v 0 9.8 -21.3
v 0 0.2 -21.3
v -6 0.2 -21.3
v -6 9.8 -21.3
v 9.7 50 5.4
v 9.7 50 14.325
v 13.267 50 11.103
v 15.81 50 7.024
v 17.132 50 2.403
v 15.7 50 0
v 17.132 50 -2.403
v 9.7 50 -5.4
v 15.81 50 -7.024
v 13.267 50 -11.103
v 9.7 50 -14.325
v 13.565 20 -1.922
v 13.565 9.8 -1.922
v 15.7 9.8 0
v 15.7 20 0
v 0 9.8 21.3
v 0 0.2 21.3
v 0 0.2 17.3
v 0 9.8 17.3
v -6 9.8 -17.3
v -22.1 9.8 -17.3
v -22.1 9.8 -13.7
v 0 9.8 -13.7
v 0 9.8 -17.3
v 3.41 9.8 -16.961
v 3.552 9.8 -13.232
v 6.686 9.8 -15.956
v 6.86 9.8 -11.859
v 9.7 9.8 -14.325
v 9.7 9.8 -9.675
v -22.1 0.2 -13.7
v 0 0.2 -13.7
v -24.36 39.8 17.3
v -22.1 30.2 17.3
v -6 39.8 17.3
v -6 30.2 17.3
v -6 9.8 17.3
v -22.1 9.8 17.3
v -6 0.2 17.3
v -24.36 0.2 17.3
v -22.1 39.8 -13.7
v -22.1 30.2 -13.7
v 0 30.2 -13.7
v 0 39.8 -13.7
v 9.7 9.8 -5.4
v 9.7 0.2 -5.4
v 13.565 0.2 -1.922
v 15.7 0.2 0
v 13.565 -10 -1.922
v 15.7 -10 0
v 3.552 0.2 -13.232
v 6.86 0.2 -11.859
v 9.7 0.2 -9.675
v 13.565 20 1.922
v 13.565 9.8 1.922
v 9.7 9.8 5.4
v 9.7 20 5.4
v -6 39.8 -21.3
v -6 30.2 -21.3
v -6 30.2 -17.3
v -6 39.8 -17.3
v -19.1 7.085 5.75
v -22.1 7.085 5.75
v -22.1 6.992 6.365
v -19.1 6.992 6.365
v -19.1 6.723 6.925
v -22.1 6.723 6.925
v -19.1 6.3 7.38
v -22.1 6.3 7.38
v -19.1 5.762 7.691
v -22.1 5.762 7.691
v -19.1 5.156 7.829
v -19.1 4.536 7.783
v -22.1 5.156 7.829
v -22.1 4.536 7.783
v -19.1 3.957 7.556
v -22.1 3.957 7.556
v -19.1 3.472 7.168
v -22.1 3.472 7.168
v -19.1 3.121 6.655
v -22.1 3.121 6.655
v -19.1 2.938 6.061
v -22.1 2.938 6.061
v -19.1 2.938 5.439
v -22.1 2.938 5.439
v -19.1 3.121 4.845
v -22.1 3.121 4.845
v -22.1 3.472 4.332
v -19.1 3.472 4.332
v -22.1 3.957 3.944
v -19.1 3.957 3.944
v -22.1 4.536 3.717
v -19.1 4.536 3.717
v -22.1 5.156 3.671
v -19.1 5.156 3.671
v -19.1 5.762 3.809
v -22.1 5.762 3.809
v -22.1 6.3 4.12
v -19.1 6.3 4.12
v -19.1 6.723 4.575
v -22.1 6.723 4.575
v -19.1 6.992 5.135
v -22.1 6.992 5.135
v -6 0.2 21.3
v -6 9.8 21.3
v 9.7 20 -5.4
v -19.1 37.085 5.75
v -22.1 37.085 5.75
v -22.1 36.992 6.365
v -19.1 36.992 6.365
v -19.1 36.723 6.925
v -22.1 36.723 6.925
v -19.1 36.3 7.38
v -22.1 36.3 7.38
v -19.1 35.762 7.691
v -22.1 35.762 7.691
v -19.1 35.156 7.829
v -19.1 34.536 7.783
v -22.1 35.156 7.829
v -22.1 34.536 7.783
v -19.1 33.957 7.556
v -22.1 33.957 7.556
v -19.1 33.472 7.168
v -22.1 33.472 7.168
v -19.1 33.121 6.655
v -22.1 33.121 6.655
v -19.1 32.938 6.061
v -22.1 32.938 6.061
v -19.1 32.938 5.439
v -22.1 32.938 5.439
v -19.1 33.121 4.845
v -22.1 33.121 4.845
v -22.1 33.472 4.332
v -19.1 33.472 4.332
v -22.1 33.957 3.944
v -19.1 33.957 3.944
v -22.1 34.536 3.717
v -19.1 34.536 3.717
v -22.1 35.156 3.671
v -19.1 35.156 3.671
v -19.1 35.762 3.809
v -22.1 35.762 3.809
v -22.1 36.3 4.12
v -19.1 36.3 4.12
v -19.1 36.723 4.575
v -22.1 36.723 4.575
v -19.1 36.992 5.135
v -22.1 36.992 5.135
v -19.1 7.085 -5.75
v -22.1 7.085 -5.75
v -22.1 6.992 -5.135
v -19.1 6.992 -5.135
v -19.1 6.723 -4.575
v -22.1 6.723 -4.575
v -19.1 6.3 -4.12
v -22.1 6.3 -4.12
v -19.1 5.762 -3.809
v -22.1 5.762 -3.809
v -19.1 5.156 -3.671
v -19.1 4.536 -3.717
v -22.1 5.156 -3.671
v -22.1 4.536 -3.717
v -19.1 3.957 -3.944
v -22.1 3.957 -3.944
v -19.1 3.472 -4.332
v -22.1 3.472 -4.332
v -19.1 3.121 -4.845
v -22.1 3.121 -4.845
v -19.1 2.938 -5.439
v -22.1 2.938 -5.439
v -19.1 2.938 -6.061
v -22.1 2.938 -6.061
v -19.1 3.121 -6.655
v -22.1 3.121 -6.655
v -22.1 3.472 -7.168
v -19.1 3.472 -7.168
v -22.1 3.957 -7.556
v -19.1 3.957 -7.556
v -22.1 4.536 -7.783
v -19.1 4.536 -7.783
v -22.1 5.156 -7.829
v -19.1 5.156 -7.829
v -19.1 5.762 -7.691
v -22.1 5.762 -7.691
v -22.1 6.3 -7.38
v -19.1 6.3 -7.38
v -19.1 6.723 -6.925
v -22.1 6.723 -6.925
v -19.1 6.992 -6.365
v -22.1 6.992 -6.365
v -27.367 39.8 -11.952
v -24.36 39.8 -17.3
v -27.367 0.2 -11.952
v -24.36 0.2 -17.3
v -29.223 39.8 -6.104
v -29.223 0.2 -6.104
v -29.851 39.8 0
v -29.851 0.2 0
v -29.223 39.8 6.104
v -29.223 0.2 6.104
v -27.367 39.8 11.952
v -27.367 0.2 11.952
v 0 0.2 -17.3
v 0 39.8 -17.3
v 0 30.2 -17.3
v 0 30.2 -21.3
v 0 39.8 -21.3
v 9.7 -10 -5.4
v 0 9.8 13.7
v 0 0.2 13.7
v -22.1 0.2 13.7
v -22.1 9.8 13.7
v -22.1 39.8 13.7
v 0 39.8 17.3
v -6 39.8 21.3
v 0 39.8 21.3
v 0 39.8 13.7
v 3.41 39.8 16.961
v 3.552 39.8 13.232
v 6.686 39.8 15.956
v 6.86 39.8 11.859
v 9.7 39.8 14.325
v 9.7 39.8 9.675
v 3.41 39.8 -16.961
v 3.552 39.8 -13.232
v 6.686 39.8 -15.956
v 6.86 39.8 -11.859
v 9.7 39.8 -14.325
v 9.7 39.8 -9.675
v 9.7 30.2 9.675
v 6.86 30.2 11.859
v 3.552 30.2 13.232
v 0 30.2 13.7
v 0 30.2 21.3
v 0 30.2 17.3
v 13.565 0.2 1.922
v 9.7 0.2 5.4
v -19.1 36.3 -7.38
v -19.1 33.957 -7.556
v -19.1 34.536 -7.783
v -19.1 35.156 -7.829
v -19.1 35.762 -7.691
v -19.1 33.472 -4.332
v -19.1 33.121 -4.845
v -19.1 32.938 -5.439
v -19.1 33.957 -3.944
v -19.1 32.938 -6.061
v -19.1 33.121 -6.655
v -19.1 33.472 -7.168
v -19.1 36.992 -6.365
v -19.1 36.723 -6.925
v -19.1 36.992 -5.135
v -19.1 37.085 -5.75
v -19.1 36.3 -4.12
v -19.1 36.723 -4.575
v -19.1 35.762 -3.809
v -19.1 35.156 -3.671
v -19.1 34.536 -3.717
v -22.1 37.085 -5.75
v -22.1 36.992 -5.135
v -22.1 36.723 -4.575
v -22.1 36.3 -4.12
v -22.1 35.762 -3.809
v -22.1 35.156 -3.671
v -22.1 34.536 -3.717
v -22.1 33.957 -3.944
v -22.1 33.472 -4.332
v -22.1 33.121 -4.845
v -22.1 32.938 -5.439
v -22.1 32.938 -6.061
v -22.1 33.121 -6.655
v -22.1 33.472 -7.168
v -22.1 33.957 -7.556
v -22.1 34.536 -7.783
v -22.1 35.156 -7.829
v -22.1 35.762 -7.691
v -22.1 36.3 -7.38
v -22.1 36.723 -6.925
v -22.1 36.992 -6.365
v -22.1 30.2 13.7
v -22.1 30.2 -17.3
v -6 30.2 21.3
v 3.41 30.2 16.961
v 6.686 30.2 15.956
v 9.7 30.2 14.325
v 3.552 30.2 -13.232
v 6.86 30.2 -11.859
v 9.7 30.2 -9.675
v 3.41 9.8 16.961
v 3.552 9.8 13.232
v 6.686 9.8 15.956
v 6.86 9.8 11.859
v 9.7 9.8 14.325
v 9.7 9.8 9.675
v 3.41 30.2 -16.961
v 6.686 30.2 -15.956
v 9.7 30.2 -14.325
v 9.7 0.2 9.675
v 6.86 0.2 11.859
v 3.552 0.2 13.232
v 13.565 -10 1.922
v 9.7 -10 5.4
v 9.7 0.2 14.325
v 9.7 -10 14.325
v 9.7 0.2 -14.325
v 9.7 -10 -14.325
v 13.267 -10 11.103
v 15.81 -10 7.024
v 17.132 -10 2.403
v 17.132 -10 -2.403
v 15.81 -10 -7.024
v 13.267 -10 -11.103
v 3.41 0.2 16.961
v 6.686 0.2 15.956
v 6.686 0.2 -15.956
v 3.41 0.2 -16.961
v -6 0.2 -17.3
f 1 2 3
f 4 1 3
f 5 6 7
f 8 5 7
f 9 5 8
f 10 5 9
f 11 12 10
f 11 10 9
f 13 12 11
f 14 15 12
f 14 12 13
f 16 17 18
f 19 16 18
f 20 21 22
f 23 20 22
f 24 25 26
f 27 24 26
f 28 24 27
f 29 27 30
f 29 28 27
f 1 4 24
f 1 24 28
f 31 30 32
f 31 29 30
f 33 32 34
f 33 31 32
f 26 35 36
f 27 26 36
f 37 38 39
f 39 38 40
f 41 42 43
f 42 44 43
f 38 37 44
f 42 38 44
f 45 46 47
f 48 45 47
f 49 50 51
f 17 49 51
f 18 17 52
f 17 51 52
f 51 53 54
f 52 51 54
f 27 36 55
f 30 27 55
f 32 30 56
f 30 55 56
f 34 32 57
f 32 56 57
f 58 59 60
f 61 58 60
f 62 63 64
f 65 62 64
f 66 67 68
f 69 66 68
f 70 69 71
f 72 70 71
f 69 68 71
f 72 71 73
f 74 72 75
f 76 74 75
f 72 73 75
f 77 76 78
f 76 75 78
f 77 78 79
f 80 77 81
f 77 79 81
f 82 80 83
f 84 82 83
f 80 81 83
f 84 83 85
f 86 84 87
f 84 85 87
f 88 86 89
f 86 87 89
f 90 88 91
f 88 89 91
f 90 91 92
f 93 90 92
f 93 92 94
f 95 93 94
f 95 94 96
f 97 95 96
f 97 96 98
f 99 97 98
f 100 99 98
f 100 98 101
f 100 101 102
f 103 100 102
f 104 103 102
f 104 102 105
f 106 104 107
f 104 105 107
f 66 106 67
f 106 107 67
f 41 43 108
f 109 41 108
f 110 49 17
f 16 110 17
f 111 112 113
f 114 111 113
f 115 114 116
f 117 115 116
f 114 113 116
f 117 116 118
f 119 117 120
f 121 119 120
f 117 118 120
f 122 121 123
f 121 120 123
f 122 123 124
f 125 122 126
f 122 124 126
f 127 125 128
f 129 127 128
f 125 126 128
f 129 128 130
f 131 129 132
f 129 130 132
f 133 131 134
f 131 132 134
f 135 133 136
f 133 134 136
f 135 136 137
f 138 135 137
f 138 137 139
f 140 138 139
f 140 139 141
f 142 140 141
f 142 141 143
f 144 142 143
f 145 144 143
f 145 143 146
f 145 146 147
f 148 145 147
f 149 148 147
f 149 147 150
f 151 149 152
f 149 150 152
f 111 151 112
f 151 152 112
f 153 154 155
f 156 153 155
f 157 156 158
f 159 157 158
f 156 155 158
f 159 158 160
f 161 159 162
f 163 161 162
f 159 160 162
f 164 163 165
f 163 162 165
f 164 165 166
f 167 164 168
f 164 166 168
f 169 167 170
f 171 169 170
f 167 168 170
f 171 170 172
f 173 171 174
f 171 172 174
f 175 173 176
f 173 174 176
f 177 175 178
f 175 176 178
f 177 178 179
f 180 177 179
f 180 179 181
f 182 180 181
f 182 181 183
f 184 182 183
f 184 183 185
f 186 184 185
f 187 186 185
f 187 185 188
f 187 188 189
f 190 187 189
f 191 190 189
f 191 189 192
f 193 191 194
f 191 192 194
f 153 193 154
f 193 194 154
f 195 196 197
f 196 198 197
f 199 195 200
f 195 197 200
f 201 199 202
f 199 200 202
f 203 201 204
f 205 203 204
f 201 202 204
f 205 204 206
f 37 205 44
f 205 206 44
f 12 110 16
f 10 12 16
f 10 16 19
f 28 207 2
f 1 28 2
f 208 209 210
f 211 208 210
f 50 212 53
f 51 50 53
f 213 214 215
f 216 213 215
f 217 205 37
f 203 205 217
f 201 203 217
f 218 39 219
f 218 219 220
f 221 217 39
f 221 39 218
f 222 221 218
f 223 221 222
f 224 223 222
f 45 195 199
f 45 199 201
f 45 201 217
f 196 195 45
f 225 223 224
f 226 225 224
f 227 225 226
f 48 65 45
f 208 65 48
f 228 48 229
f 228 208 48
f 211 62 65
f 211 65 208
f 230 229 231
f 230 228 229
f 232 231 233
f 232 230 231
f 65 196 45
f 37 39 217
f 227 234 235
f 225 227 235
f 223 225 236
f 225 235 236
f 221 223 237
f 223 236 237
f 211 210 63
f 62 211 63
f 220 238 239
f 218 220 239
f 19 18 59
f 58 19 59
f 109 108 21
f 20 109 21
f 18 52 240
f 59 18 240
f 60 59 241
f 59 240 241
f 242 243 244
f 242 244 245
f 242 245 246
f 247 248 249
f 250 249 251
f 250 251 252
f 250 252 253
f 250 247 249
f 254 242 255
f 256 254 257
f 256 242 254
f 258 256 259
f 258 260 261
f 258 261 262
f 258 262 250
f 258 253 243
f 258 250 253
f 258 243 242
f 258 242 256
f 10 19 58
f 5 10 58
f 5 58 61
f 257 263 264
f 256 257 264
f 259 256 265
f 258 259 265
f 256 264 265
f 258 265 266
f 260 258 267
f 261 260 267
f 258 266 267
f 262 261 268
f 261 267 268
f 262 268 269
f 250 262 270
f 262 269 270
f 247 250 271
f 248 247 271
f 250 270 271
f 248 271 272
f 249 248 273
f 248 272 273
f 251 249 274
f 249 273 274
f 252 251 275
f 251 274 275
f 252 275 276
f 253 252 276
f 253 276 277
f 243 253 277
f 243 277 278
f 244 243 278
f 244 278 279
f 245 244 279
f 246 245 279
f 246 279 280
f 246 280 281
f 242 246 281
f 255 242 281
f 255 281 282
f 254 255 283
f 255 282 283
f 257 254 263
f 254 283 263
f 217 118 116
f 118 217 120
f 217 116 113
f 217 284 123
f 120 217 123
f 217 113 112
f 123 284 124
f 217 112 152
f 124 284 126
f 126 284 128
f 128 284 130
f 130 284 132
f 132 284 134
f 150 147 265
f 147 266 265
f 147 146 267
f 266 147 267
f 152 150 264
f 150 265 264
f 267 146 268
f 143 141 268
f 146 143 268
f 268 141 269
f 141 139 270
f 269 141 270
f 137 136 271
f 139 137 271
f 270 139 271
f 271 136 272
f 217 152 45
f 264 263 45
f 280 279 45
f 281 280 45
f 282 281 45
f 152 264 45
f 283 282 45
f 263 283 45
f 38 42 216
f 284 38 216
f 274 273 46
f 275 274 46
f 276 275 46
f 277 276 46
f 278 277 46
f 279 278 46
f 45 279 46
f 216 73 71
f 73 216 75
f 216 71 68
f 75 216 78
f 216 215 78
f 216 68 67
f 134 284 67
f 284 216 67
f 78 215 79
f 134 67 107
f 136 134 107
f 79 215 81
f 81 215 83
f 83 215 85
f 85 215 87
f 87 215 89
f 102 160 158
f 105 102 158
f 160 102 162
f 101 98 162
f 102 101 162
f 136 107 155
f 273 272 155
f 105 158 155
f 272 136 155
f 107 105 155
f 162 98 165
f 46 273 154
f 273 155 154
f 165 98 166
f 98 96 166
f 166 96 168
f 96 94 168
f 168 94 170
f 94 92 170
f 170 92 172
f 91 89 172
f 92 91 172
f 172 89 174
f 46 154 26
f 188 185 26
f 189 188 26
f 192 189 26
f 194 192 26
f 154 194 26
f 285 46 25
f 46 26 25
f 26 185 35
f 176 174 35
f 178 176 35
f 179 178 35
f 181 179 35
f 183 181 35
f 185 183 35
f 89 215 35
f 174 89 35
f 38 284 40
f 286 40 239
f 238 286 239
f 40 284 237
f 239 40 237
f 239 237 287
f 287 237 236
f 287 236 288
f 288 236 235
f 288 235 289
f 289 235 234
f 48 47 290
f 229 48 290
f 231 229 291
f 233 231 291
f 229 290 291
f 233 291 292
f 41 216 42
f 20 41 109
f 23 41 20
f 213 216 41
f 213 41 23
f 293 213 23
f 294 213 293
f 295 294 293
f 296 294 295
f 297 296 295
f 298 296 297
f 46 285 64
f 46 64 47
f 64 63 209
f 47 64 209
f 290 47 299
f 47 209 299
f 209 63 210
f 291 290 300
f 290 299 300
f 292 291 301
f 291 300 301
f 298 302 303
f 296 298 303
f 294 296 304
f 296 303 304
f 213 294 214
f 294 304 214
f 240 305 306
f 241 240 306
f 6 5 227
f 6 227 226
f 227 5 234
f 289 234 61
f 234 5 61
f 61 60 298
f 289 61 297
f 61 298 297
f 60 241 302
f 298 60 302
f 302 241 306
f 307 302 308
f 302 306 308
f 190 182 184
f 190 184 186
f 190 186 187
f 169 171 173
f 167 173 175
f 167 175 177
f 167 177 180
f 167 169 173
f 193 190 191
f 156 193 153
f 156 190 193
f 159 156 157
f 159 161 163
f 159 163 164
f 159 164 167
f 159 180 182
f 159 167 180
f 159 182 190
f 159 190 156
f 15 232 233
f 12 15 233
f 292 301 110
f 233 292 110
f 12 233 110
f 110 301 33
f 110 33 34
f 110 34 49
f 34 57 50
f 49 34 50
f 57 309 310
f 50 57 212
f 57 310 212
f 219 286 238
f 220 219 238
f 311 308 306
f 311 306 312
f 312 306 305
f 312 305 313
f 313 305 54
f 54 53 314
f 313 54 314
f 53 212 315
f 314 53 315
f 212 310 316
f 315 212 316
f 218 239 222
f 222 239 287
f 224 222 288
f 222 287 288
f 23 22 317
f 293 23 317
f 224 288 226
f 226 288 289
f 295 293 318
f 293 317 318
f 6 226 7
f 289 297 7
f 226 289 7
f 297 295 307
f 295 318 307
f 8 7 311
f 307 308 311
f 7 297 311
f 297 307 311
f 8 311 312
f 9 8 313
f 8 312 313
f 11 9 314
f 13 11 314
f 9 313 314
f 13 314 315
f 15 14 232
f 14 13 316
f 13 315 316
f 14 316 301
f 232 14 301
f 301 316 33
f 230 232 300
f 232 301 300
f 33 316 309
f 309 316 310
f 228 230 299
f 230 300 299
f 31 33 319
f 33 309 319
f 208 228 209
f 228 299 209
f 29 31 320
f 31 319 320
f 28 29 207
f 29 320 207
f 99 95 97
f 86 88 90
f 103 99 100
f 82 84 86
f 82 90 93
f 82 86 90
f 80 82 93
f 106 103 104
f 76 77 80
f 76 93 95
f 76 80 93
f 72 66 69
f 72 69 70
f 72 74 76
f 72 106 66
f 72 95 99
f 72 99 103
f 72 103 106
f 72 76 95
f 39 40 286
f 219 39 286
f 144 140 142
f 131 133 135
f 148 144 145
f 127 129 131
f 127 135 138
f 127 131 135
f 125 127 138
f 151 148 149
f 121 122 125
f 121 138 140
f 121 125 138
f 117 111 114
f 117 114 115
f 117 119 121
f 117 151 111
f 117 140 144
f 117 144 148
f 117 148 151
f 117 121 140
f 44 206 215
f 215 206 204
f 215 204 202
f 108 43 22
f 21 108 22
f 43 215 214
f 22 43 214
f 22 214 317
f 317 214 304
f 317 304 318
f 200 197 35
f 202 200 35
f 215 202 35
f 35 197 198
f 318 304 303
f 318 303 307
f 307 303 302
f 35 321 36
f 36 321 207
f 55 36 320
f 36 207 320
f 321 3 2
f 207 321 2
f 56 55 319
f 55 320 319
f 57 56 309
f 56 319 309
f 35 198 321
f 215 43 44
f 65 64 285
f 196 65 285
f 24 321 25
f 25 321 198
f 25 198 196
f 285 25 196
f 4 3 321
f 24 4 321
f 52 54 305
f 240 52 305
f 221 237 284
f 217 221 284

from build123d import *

# Parameters (mm, degrees)
BOSS_EXTRUDE1_START = 0.2
BOSS_EXTRUDE1_DEPTH = 9.6
BOSS_EXTRUDE2_START = -10
BOSS_EXTRUDE2_DEPTH = 30
MIRROR1_START       = 9.8
MIRROR1_DEPTH       = 30
MIRROR1_START_2     = 30.2
MIRROR1_2_DEPTH     = 9.6
MIRROR1_START_3     = 39.8
MIRROR1_3_DEPTH     = 10.2
MIRROR1_START_4     = -22.1
MIRROR1_4_OUTLINE_R = 2.085
MIRROR1_4_DEPTH     = 3


with BuildPart() as part:
    # Sketch1 → Boss-Extrude1 (new body)
    with BuildSketch(Plane(origin=(0, 0, 0), x_dir=(1, 0, 0), z_dir=(0, 1, 0)).offset(BOSS_EXTRUDE1_START)):
        with BuildLine():
            ThreePointArc((-24.36, 17.3), (-29.850614043, 0), (-24.36, -17.3))
            Line((-24.36, -17.3), (-6, -17.3))
            Line((-6, -17.3), (-6, -21.3))
            Line((-6, -21.3), (0, -21.3))
            Line((0, -21.3), (0, -17.3))
            ThreePointArc((0, -17.3), (17.3, 0), (0, 17.3))
            Line((0, 17.3), (0, 21.3))
            Line((0, 21.3), (-6, 21.3))
            Line((-6, 21.3), (-6, 17.3))
            Line((-6, 17.3), (-24.36, 17.3))
        make_face()
        with BuildLine():
            Line((0, -13.7), (-22.1, -13.7))
            Line((-22.1, -13.7), (-22.1, 13.7))
            Line((-22.1, 13.7), (0, 13.7))
            ThreePointArc((0, 13.7), (5.251022882, 12.653725091), (9.7, 9.674709298))
            Line((9.7, 9.674709298), (9.7, 5.4))
            Line((9.7, 5.4), (15.7, 0))
            Line((15.7, 0), (9.7, -5.4))
            Line((9.7, -5.4), (9.7, -9.674709298))
            ThreePointArc((9.7, -9.674709298), (5.251022882, -12.653725091), (0, -13.7))
        make_face(mode=Mode.SUBTRACT)
    extrude(amount=BOSS_EXTRUDE1_DEPTH)

    # Sketch1<3> → Boss-Extrude2 (add)
    with BuildSketch(Plane(origin=(0, 0, 0), x_dir=(1, 0, 0), z_dir=(0, 1, 0)).offset(BOSS_EXTRUDE2_START)):
        with BuildLine():
            Line((9.7, 14.324803664), (9.7, 9.674709298))
            ThreePointArc((9.7, 9.674709298), (12.261151879, 6.111804528), (13.564518925, 1.921932967))
            Line((13.564518925, 1.921932967), (15.7, 0))
            Line((15.7, 0), (13.564518925, -1.921932967))
            ThreePointArc((13.564518925, -1.921932967), (12.261151879, -6.111804528), (9.7, -9.674709298))
            Line((9.7, -9.674709298), (9.7, -14.324803664))
            ThreePointArc((9.7, -14.324803664), (17.3, 0), (9.7, 14.324803664))
        make_face()
        with BuildLine():
            Line((9.7, -5.4), (9.7, -9.674709298))
            ThreePointArc((9.7, -9.674709298), (12.261151879, -6.111804528), (13.564518925, -1.921932967))
            Line((13.564518925, -1.921932967), (9.7, -5.4))
        make_face()
        with BuildLine():
            ThreePointArc((13.564518925, 1.921932967), (12.261151879, 6.111804528), (9.7, 9.674709298))
            Line((9.7, 9.674709298), (9.7, 5.4))
            Line((9.7, 5.4), (13.564518925, 1.921932967))
        make_face()
    extrude(amount=BOSS_EXTRUDE2_DEPTH)

    # Mirror1: read off the stored shape, not the designer's step
    # Mirror1 outline → Mirror1 (add)
    with BuildSketch(Plane(origin=(0, 0, 0), x_dir=(1, 0, 0), z_dir=(0, 1, 0)).offset(MIRROR1_START)):
        with BuildLine():
            Line((-22.1, -17.3), (-22.1, 17.3))
            Line((-22.1, 17.3), (-24.36, 17.3))
            ThreePointArc((-24.36, 17.3), (-29.850614043, 0), (-24.36, -17.3))
            Line((-24.36, -17.3), (-22.1, -17.3))
        make_face()
        with BuildLine():
            Line((9.7, -5.4), (9.7, -14.324803664))
            ThreePointArc((9.7, -14.324803664), (17.3, 0), (9.7, 14.324803664))
            Line((9.7, 14.324803664), (9.7, 5.4))
            Line((9.7, 5.4), (15.7, 0))
            Line((15.7, 0), (9.7, -5.4))
        make_face()
    extrude(amount=MIRROR1_DEPTH)

    # Mirror1 2 outline → Mirror1 2 (add)
    with BuildSketch(Plane(origin=(0, 0, 0), x_dir=(1, 0, 0), z_dir=(0, 1, 0)).offset(MIRROR1_START_2)):
        with BuildLine():
            Line((0, -13.7), (-22.1, -13.7))
            Line((-22.1, -13.7), (-22.1, -17.3))
            Line((-22.1, -17.3), (-6, -17.3))
            Line((-6, -17.3), (-6, -21.3))
            Line((-6, -21.3), (0, -21.3))
            Line((0, -21.3), (0, -17.3))
            ThreePointArc((0, -17.3), (5.073011759, -16.539484626), (9.7, -14.324803664))
            Line((9.7, -14.324803664), (9.7, -9.674709298))
            ThreePointArc((9.7, -9.674709298), (5.251022882, -12.653725091), (0, -13.7))
        make_face()
        with BuildLine():
            Line((-22.1, 17.3), (-22.1, 13.7))
            Line((-22.1, 13.7), (0, 13.7))
            ThreePointArc((0, 13.7), (5.251022882, 12.653725091), (9.7, 9.674709298))
            Line((9.7, 9.674709298), (9.7, 14.324803664))
            ThreePointArc((9.7, 14.324803664), (5.073011759, 16.539484626), (0, 17.3))
            Line((0, 17.3), (0, 21.3))
            Line((0, 21.3), (-6, 21.3))
            Line((-6, 21.3), (-6, 17.3))
            Line((-6, 17.3), (-22.1, 17.3))
        make_face()
    extrude(amount=MIRROR1_2_DEPTH)

    # Mirror1 3 outline → Mirror1 3 (add)
    with BuildSketch(Plane(origin=(0, 0, 0), x_dir=(1, 0, 0), z_dir=(0, 1, 0)).offset(MIRROR1_START_3)):
        with BuildLine():
            Line((9.7, -5.4), (9.7, -14.324803664))
            ThreePointArc((9.7, -14.324803664), (17.3, 0), (9.7, 14.324803664))
            Line((9.7, 14.324803664), (9.7, 5.4))
            Line((9.7, 5.4), (15.7, 0))
            Line((15.7, 0), (9.7, -5.4))
        make_face()
    extrude(amount=MIRROR1_3_DEPTH)

    # Mirror1 4 outline → Mirror1 4 (add)
    with BuildSketch(Plane.YZ.offset(MIRROR1_START_4)):
        with Locations((5, 5.75)):
            Circle(MIRROR1_4_OUTLINE_R)
        with Locations((5, -5.75)):
            Circle(MIRROR1_4_OUTLINE_R)
        with Locations((35, 5.75)):
            Circle(MIRROR1_4_OUTLINE_R)
        with Locations((35, -5.75)):
            Circle(MIRROR1_4_OUTLINE_R)
    extrude(amount=MIRROR1_4_DEPTH)


solid = part.part
